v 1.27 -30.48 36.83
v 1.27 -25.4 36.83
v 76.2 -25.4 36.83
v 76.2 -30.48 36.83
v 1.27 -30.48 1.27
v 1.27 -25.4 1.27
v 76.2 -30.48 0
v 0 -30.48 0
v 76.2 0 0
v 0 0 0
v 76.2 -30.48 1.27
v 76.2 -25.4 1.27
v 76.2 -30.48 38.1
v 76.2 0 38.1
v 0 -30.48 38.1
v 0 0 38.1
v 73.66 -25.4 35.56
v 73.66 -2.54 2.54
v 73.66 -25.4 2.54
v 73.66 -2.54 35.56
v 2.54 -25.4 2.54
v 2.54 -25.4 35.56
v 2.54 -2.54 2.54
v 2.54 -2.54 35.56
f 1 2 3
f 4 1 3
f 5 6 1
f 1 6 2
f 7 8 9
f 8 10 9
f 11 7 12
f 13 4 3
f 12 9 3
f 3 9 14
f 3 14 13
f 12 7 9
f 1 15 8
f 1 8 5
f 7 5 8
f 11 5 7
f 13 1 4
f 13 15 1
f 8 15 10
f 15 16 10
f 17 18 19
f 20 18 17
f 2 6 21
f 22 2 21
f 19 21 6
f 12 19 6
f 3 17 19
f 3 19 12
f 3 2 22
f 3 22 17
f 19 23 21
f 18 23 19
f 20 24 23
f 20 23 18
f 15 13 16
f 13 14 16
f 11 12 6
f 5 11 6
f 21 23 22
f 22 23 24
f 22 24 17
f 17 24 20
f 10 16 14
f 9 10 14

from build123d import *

# Parameters (mm, degrees)
F0_W     = 76.2
F0_H     = 38.1
F1_DEPTH = 25.4
F2_T     = -2.54
F4_DEPTH = 5.08


with BuildPart() as f1:
    # F0 (on Front) → F1 (new body)
    with BuildSketch(Plane.XZ):
        with Locations((38.1, 19.05)):
            Rectangle(F0_W, F0_H)
    extrude(amount=F1_DEPTH)

    # F2
    f2_openings = [f1.faces().sort_by_distance(p)[0] for p in [
        (38.1, -25.4, 19.05),
    ]]
    offset(amount=F2_T, openings=f2_openings)

    # F3 (on face) → F4 (join)
    with BuildSketch(Plane.XZ.offset(25.4)):
        Polygon((1.27, 36.83), (76.2, 36.83), (76.2, 38.1), (0, 38.1), (0, 0), (76.2, 0), (76.2, 1.27), (1.27, 1.27), align=None)
    extrude(amount=F4_DEPTH)


solid = f1.part
